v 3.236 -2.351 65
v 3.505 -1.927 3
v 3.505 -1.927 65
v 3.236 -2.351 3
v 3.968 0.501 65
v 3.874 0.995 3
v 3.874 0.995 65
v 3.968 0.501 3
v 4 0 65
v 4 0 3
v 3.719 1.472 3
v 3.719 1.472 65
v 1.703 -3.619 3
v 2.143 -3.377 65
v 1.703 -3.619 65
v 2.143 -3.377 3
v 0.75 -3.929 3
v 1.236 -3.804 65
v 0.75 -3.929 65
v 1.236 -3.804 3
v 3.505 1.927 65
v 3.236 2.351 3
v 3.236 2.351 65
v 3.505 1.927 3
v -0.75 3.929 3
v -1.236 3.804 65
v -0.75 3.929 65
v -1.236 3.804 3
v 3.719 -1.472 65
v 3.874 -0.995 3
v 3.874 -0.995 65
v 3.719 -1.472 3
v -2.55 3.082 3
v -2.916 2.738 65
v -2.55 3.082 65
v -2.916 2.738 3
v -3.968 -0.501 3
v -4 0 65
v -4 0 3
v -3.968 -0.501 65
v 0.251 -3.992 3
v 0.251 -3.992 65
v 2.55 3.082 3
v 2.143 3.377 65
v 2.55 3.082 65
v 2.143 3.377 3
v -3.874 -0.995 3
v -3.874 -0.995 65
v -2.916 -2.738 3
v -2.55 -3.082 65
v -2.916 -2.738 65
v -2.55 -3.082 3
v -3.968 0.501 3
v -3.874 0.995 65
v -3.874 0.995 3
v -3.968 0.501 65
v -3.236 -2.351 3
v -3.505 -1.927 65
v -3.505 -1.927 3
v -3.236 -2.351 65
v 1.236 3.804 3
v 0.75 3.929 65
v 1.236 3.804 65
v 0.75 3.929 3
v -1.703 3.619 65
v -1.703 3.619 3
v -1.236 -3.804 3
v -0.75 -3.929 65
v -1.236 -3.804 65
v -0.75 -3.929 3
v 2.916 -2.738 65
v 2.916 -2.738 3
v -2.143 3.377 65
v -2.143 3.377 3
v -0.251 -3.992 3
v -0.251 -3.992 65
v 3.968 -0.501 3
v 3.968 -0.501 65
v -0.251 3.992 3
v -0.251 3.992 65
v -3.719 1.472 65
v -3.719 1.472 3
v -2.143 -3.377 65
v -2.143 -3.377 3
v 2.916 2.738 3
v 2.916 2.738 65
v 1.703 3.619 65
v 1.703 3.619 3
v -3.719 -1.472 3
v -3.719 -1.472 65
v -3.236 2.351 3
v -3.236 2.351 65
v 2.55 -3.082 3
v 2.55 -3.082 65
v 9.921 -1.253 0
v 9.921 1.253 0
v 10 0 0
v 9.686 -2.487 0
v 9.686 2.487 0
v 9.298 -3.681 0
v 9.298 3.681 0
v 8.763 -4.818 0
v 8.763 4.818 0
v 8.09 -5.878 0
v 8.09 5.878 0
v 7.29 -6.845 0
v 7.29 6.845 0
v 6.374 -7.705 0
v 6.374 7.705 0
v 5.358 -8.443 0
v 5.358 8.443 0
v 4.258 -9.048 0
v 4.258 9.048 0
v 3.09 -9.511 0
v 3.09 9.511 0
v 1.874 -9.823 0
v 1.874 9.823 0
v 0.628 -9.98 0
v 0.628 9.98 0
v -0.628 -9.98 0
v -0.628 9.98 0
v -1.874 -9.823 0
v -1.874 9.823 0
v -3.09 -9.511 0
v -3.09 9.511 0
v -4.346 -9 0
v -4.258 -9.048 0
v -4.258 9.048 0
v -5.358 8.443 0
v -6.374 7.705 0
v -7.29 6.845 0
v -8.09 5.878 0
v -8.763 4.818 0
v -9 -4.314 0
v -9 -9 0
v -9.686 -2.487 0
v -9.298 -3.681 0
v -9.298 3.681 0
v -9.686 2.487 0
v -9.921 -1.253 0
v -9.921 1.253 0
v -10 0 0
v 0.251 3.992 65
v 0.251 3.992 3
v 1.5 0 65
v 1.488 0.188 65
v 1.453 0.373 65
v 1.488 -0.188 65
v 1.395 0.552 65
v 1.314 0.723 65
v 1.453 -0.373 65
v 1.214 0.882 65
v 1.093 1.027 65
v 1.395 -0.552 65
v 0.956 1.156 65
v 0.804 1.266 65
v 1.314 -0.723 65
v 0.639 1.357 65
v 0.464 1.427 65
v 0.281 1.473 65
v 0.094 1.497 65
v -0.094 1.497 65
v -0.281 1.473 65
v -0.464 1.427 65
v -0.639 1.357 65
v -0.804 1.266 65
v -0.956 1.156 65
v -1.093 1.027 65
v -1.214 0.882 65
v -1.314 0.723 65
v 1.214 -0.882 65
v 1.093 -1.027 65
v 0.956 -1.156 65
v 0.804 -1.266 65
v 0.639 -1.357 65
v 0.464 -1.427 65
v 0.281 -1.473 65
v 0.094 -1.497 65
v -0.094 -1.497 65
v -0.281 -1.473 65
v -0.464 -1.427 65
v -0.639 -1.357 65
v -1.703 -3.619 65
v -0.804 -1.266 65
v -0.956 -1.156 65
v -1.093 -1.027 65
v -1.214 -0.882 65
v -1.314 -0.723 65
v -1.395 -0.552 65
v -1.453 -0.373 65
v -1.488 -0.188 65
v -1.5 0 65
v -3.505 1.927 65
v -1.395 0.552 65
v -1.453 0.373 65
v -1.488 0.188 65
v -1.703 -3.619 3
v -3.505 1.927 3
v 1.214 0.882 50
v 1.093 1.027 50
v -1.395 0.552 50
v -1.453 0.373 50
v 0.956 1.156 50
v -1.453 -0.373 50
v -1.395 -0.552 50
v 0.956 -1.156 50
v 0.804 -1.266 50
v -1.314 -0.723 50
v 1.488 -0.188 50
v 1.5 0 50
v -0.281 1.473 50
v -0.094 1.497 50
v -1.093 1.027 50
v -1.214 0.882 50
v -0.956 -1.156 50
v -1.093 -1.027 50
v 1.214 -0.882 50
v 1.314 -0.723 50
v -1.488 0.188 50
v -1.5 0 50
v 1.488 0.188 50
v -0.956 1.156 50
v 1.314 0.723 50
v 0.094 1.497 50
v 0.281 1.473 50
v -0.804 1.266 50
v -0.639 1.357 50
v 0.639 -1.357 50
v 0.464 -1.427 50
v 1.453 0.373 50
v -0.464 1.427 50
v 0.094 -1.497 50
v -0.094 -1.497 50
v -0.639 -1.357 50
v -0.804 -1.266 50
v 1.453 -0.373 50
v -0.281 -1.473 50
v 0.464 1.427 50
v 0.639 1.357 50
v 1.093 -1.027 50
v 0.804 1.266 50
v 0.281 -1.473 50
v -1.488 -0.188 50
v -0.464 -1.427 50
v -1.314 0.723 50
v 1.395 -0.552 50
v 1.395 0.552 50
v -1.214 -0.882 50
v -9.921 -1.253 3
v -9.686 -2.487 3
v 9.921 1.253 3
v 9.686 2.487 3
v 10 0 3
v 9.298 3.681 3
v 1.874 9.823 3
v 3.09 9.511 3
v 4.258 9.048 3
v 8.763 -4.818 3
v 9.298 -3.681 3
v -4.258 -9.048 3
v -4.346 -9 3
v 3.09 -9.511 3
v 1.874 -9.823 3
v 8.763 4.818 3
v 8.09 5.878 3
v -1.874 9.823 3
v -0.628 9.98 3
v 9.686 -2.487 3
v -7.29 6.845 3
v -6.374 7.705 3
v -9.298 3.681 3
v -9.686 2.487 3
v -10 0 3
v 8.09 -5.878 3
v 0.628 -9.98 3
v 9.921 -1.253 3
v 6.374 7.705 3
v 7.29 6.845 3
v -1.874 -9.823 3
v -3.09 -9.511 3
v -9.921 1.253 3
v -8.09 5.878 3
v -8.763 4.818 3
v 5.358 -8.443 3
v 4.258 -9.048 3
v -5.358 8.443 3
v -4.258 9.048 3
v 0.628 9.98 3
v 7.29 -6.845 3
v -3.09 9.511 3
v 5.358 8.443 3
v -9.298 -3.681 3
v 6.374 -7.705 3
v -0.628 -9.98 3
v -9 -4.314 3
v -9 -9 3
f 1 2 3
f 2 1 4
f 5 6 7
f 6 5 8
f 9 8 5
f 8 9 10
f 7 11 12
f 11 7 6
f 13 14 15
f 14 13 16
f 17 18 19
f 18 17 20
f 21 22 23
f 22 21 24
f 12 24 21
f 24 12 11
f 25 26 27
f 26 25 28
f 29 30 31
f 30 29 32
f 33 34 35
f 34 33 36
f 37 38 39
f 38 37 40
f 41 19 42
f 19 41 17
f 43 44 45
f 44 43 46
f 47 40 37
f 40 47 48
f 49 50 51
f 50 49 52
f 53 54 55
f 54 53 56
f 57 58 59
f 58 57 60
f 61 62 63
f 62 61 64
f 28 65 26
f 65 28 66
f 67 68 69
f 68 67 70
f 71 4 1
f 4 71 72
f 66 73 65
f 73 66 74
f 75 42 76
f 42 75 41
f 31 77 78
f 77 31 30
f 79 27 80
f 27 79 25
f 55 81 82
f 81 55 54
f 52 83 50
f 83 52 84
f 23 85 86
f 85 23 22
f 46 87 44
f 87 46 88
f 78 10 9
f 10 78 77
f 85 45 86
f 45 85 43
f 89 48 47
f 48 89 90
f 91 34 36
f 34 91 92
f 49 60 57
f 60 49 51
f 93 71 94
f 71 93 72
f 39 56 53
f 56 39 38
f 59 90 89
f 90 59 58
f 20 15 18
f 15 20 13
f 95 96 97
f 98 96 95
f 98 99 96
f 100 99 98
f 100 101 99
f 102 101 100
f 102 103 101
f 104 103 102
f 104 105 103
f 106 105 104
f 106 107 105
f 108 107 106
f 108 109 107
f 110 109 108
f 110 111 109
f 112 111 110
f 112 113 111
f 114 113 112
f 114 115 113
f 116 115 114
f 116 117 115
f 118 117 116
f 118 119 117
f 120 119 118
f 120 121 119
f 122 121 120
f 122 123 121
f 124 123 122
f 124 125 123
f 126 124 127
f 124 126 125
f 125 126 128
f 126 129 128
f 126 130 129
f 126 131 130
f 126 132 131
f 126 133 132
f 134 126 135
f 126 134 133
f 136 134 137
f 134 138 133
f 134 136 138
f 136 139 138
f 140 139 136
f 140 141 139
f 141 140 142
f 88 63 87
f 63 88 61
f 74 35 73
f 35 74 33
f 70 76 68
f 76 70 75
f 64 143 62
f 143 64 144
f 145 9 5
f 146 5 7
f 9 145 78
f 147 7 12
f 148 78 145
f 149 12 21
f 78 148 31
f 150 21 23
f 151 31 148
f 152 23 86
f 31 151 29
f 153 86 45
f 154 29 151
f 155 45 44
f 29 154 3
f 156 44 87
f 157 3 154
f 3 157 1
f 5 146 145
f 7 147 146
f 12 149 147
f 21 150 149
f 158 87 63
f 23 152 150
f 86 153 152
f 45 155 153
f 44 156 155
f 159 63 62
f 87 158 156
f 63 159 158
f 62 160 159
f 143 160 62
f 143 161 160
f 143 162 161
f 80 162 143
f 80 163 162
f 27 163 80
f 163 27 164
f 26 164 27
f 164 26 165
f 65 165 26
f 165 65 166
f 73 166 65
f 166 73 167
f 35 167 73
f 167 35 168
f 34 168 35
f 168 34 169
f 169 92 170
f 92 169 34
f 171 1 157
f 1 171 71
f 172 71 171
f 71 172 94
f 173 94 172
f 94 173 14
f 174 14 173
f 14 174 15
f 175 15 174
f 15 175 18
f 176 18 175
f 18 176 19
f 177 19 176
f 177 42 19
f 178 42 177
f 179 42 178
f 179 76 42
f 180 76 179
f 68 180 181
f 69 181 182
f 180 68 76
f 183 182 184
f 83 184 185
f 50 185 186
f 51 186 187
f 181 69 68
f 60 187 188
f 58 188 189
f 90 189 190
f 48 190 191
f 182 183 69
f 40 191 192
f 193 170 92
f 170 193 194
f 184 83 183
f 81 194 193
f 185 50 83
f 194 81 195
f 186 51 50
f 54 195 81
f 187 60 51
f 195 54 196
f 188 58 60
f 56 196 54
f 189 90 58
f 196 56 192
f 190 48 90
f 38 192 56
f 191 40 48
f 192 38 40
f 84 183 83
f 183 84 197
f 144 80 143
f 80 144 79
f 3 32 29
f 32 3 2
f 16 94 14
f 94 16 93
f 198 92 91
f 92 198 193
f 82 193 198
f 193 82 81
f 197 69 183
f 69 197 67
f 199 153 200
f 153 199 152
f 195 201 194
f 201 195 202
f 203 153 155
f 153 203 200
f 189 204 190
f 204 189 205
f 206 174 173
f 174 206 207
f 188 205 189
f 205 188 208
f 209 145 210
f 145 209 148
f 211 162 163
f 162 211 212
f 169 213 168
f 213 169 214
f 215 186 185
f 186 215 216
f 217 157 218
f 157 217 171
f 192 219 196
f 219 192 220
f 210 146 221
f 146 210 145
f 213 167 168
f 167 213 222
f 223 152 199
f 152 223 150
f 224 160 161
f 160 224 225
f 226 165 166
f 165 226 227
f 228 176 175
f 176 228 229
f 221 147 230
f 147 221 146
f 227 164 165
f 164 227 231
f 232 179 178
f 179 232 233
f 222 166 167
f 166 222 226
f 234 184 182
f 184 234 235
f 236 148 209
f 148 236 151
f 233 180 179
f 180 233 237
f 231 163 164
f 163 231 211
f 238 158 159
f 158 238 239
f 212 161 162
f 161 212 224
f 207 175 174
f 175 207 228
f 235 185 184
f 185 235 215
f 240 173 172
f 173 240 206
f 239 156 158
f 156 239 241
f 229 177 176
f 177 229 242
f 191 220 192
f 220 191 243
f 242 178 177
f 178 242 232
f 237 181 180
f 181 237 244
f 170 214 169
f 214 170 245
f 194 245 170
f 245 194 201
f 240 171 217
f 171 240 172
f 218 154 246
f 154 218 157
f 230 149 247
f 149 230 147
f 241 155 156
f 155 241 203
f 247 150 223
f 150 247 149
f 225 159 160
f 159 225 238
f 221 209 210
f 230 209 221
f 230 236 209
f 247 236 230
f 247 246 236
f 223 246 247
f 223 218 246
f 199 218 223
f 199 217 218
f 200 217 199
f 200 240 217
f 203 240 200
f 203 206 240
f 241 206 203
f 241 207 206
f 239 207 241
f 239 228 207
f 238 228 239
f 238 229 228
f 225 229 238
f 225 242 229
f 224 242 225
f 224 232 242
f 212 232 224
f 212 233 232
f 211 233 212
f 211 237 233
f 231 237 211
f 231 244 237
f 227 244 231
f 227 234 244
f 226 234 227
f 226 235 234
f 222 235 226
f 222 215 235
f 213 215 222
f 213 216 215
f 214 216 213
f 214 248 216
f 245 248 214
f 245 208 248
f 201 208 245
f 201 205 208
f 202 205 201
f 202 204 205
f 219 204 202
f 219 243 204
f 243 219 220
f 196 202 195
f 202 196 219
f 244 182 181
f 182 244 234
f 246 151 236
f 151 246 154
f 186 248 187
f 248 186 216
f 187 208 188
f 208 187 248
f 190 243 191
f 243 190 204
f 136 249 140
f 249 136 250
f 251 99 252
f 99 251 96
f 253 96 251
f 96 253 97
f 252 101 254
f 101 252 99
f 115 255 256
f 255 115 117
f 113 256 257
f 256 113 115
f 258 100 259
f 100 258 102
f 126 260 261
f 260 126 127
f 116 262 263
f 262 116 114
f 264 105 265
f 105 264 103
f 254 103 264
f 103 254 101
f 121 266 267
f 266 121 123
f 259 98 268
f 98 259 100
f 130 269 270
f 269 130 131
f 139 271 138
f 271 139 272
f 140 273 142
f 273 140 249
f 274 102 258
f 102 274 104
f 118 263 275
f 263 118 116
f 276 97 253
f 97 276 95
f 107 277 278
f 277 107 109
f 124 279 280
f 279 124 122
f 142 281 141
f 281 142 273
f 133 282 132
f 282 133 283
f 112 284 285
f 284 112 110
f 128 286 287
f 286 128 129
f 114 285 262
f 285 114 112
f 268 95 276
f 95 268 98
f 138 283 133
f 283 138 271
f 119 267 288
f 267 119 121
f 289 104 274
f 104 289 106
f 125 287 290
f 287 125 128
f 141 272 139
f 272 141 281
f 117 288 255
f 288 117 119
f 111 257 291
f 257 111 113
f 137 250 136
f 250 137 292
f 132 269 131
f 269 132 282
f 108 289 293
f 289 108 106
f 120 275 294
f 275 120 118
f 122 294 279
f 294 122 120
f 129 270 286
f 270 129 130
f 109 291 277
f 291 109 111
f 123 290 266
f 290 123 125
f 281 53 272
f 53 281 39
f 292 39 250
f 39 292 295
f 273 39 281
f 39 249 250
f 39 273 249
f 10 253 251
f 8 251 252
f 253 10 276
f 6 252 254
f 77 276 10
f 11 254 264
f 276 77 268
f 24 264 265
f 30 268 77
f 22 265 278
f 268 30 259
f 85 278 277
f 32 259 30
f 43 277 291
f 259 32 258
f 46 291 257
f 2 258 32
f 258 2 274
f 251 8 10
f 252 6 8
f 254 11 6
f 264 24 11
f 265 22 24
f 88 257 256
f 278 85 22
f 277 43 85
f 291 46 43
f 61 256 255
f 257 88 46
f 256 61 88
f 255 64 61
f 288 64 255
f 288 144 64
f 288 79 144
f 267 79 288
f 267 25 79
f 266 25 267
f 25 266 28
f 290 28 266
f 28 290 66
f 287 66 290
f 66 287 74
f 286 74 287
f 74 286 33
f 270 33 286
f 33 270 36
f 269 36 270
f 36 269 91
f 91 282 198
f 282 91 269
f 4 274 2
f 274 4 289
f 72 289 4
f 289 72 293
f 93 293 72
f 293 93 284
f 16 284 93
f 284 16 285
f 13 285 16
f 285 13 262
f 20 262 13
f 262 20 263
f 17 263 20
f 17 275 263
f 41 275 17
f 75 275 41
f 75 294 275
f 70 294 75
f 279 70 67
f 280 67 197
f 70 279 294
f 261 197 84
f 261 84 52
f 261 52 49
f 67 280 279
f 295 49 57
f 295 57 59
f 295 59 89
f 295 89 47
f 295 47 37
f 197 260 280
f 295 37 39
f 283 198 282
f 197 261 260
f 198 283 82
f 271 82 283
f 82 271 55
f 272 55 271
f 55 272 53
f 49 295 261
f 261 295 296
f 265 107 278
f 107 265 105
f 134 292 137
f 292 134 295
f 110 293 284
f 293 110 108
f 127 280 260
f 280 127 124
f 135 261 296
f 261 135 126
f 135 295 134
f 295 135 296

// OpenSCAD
// knob for z axis

$fn=5*10;


//Total Dial Length mm
Length=65;

//Thickness of the dial head in mm
Dial=3;

// Knob add ons
add ="pointer"; //[none,pointer,knurled]

cylinder(h=Dial,r=10);

if (add=="knurled")
{
  for ( i = [0 : 10] )
  {
      translate([sin(i*36)*9,cos(i*36)*9, 0]) cylinder(h=Dial,r=3);
  }
}

if (add=="pointer")
{
    translate([-9,-9,0]) linear_extrude(height=Dial) polygon(points=[[0,0],[7,0],[0,7]], paths=[[0,1,2]]);
}

difference () {
cylinder(h=Length,r=4);
translate([0,0,Length-15]) cylinder(h=20,r=1.5);
}
